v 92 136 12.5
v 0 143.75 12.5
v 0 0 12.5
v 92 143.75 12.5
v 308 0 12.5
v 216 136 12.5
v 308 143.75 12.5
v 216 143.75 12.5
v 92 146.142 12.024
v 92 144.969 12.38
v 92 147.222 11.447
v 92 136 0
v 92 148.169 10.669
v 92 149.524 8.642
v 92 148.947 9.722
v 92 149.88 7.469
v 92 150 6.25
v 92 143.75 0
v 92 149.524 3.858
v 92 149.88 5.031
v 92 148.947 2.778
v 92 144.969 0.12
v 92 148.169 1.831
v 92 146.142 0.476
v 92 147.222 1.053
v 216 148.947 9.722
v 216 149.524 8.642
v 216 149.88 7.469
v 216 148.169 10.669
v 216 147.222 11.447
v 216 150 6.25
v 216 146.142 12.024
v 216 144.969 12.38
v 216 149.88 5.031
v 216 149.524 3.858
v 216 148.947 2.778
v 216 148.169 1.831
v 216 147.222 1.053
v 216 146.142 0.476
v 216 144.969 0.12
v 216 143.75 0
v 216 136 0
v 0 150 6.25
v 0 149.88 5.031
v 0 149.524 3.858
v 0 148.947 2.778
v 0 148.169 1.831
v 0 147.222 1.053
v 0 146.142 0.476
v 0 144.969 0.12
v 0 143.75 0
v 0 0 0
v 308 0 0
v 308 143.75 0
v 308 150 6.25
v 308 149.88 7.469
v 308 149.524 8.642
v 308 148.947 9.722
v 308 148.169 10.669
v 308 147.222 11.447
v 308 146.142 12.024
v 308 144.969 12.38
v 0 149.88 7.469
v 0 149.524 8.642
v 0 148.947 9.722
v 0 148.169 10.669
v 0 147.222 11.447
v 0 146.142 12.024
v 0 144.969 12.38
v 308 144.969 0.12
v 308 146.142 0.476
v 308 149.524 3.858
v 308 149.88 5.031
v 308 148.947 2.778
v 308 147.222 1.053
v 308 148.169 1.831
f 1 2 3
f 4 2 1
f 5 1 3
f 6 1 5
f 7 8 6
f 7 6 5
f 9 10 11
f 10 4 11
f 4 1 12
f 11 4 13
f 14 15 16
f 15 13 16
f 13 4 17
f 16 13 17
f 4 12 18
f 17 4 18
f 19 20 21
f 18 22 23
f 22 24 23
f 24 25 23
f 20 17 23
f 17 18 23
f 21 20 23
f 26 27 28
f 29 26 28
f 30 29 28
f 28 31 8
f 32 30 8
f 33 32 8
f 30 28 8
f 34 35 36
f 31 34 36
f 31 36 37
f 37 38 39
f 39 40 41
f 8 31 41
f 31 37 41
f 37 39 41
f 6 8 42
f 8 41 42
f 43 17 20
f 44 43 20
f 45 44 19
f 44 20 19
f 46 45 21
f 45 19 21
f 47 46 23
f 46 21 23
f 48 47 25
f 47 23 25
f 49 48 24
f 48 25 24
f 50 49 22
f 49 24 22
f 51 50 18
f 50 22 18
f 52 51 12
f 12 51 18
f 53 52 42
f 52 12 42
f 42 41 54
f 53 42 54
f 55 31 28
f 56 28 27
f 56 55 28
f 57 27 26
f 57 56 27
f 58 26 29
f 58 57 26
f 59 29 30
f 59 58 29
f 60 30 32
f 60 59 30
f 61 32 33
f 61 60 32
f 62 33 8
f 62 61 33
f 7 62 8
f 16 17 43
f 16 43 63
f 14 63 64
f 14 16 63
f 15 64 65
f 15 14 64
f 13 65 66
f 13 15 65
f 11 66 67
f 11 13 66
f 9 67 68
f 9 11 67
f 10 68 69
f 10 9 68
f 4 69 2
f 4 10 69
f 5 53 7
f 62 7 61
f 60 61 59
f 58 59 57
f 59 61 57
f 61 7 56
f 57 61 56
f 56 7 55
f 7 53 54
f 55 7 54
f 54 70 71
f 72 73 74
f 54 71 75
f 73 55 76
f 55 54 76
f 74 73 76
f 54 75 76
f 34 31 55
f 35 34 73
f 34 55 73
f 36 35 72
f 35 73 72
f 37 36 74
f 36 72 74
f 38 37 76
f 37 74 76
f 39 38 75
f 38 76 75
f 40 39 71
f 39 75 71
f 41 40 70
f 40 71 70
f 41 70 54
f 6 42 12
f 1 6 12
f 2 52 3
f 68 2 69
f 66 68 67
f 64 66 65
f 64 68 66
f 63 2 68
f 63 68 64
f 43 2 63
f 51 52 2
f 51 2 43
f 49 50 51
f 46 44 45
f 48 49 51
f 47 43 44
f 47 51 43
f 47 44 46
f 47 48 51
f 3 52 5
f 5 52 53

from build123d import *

# Parameters (mm, degrees)
SKETCH_1_W          = 308
SKETCH_1_H          = 150
EXTRUDE_1_DEPTH     = 12.5
FILLET_1_R          = 6.25
FILLET_2_R          = 6.25
CUT_EXTRUDE_1_DEPTH = 44


with BuildPart() as part:
    # 草图1 → 凸台-拉伸1 (new body)
    with BuildSketch(Plane.XY):
        with Locations((154, 75)):
            Rectangle(SKETCH_1_W, SKETCH_1_H)
    extrude(amount=EXTRUDE_1_DEPTH)

    # 圆角1
    fillet_1_edges = [part.edges().sort_by_distance(p)[0] for p in [
        (154, 150, 12.5),
    ]]
    fillet(fillet_1_edges, radius=FILLET_1_R)

    # 圆角2
    fillet_2_edges = [part.edges().sort_by_distance(p)[0] for p in [
        (154, 150, 0),
    ]]
    fillet(fillet_2_edges, radius=FILLET_2_R - 0.0001)  # a hair under: the kernel refuses the full size

    # 草图2 → 切除-拉伸1 (cut)
    with BuildSketch(Plane(origin=(0, 0, 0), x_dir=(-1, 0, 0), z_dir=(0, 0, -1))):
        Polygon((-154, 136), (-92, 136), (-92, 165.928579256), (-216, 165.928579256), (-216, 136), align=None)
    extrude(amount=-CUT_EXTRUDE_1_DEPTH, mode=Mode.SUBTRACT)


solid = part.part
